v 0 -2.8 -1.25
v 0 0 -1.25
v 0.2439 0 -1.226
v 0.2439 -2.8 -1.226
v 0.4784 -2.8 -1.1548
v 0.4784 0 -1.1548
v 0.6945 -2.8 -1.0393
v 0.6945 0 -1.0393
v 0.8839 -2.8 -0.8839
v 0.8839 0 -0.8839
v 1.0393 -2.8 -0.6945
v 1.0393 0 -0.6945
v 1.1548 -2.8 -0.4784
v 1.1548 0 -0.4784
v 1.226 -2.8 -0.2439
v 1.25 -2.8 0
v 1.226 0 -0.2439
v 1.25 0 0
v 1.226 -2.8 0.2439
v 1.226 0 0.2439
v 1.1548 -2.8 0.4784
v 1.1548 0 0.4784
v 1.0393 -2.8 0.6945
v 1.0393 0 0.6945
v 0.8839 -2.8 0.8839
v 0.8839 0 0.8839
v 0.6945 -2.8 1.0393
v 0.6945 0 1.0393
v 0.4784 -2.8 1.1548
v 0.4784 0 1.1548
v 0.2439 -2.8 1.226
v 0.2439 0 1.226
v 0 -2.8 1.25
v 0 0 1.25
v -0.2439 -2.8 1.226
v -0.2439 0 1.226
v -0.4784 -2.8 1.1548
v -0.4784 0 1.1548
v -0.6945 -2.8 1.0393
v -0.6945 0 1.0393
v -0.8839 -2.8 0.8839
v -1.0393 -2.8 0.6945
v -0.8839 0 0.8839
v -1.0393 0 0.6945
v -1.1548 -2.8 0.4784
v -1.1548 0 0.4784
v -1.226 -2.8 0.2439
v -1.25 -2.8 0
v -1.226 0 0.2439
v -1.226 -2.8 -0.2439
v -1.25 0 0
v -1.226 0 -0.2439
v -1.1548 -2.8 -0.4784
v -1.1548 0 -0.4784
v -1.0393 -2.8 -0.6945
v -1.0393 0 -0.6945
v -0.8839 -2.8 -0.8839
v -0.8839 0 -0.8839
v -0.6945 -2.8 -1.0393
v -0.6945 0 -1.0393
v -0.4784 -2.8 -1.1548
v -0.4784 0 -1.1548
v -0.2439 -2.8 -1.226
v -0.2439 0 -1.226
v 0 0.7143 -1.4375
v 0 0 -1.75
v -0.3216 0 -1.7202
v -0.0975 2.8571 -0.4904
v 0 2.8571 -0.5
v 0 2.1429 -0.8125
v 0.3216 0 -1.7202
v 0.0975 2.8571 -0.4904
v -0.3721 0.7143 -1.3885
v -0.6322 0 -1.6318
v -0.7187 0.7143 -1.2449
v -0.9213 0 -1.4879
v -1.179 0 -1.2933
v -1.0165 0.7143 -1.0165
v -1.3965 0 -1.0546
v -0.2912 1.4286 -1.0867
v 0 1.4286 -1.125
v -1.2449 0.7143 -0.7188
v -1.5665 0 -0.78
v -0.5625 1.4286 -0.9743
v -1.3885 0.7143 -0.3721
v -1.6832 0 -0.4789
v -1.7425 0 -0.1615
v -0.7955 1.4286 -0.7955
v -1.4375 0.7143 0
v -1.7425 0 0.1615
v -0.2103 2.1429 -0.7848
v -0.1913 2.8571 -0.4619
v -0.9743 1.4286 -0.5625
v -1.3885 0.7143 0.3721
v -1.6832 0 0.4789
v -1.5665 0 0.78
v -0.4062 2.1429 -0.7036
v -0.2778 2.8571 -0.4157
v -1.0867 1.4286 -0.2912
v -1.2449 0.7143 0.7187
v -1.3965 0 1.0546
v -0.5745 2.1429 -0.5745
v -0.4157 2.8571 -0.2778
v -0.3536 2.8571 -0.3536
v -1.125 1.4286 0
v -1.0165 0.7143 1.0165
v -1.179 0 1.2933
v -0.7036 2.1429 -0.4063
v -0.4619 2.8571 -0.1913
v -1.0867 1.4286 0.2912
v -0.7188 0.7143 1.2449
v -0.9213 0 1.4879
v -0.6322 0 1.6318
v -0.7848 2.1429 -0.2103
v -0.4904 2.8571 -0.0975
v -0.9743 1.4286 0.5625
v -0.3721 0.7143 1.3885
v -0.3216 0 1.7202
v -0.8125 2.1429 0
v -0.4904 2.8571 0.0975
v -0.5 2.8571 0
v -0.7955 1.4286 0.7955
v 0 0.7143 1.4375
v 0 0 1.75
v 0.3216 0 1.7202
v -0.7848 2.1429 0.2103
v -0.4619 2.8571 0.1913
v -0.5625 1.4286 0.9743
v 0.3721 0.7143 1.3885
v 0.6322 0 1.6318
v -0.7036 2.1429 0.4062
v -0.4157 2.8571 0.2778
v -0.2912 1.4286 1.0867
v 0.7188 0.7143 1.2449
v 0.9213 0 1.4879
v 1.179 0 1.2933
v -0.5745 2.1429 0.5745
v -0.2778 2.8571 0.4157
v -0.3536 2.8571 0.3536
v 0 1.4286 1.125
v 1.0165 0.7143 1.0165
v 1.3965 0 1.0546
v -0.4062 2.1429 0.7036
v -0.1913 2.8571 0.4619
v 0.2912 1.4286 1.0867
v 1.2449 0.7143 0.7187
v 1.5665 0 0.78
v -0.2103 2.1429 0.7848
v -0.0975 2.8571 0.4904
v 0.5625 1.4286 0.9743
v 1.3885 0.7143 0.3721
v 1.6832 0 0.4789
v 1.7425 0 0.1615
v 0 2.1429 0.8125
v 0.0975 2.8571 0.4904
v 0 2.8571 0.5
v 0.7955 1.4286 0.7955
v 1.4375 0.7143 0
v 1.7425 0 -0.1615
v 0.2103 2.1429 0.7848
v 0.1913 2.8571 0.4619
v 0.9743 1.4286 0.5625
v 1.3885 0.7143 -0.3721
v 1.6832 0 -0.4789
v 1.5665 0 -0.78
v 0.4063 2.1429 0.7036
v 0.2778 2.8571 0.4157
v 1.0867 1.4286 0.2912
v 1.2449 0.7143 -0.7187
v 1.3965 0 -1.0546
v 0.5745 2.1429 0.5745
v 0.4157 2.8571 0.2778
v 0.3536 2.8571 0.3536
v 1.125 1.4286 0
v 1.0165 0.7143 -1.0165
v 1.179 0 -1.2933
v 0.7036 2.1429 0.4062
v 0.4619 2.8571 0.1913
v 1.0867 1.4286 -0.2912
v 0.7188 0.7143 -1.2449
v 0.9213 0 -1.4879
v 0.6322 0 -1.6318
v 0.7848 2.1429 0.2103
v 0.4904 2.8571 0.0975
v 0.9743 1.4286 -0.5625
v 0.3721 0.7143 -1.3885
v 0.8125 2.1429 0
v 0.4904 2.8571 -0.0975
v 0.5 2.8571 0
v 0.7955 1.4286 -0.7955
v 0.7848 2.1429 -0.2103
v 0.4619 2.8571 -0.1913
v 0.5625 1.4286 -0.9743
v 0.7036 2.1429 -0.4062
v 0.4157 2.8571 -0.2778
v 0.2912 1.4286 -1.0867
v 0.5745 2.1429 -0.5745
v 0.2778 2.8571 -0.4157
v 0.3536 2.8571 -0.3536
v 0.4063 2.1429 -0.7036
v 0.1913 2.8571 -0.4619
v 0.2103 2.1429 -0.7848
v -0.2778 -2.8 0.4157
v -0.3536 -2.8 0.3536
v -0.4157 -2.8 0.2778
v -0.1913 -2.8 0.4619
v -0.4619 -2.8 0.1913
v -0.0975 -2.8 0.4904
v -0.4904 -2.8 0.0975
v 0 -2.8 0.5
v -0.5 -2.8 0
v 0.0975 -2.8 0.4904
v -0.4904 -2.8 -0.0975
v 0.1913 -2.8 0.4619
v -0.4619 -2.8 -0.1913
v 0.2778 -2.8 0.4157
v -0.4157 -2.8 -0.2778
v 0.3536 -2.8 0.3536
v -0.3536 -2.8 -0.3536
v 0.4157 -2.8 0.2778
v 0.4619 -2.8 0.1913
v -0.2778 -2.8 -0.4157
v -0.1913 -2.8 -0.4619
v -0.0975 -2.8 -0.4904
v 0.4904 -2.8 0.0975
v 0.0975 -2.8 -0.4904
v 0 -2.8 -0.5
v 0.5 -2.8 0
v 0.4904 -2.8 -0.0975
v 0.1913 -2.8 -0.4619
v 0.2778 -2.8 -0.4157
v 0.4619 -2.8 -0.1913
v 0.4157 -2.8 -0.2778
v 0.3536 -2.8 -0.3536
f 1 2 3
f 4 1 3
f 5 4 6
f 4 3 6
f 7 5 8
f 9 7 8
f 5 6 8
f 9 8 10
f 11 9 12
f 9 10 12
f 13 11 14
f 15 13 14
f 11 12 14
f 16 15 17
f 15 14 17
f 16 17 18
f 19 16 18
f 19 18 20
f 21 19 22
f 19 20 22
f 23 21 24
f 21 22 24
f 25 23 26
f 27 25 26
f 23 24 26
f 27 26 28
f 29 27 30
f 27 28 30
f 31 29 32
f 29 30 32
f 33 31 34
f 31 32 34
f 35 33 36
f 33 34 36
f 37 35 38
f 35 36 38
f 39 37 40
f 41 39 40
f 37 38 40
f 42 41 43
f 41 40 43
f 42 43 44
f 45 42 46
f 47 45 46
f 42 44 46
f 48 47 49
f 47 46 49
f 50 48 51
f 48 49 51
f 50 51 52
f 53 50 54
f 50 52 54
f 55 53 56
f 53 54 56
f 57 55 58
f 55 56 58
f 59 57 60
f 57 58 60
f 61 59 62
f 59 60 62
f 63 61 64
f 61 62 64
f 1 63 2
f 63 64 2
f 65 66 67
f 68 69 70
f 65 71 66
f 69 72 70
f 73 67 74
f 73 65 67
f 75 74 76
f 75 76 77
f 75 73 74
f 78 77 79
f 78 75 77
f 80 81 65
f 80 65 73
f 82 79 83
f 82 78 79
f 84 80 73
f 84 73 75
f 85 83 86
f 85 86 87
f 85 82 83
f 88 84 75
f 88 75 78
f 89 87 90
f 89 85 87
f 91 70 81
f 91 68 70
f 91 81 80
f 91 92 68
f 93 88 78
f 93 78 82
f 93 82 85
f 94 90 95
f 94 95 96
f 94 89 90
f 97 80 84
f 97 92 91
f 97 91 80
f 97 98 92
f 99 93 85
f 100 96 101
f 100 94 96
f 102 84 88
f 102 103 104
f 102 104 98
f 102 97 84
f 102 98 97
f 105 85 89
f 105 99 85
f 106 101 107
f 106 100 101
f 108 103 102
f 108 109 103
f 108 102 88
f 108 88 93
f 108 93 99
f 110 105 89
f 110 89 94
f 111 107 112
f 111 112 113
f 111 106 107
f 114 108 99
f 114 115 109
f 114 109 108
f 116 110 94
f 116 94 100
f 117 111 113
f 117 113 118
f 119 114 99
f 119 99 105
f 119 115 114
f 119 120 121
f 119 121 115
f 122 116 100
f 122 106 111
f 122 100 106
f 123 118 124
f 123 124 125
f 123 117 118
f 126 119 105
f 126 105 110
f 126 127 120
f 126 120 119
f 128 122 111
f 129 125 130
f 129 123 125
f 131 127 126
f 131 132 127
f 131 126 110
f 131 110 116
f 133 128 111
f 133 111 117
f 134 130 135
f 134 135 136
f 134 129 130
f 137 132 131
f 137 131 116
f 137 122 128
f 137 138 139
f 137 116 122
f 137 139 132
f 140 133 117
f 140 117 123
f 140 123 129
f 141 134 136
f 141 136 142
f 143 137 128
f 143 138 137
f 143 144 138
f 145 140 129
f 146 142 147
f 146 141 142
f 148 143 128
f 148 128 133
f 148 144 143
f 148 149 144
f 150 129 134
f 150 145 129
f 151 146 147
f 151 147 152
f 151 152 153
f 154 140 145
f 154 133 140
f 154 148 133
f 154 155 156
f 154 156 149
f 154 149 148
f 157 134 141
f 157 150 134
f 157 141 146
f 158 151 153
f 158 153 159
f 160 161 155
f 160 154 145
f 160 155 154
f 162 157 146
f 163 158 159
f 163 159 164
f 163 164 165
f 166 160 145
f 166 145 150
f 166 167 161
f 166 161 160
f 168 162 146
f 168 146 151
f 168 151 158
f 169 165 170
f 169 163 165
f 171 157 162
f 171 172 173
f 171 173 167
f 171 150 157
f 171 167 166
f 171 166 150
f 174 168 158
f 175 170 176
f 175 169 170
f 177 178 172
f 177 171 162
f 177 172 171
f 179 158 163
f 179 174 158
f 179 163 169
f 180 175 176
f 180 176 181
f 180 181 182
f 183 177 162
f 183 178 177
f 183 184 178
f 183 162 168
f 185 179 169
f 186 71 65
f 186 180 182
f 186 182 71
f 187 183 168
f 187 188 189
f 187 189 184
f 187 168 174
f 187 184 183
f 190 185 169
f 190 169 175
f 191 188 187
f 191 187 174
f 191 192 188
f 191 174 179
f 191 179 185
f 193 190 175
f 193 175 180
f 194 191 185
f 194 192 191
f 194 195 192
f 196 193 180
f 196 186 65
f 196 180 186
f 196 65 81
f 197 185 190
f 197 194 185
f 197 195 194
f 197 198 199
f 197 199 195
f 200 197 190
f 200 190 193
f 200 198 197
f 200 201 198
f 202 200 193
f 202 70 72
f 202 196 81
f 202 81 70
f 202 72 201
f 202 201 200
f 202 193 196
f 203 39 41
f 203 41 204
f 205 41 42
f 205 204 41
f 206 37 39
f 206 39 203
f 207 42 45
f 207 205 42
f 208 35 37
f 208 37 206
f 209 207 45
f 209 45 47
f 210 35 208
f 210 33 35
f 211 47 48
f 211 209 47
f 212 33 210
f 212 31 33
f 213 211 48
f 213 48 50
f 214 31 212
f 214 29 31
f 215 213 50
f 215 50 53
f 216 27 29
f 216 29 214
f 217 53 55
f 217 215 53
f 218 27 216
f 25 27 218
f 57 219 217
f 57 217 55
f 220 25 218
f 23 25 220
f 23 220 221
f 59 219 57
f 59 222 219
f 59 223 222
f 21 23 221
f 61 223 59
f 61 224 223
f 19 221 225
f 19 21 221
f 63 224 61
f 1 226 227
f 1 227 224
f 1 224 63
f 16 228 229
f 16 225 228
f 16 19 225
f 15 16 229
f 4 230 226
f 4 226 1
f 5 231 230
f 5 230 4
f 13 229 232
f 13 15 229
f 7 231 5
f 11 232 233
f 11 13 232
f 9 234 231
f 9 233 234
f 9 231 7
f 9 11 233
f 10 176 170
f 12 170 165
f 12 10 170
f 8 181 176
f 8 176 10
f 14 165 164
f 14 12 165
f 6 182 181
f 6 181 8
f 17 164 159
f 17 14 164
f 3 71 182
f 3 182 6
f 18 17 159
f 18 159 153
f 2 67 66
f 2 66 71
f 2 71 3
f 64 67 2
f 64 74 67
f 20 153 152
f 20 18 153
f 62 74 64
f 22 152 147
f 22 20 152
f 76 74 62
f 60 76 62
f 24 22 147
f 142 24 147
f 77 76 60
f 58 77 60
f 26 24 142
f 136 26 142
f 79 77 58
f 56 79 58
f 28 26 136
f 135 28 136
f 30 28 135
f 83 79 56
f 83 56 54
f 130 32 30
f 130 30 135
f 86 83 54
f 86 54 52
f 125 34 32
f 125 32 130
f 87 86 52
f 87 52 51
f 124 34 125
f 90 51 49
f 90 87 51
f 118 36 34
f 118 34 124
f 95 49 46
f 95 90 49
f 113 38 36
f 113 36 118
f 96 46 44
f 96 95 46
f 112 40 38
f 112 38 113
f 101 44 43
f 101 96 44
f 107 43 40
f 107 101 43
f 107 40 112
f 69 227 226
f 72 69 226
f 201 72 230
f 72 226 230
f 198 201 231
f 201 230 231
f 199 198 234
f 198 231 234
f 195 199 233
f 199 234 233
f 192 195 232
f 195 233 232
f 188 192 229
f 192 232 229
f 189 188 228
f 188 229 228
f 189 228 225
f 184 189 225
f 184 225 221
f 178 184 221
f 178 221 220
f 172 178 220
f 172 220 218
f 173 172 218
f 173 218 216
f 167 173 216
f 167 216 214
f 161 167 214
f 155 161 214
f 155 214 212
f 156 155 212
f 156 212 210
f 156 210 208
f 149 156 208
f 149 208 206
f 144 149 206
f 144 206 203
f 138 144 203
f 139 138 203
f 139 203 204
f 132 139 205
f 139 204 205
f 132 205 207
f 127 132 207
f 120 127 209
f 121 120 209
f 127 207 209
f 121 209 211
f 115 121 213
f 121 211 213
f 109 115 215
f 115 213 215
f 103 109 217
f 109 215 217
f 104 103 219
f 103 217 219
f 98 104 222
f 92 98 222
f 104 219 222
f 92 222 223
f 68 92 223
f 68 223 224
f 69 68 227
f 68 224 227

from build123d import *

# Parameters (mm, degrees)
ESQUISSE3_R             = 1.25
BOSS_EXTRU_1_DEPTH      = 2.8
ESQUISSE4_R             = 0.5
ENL_V_MAT_EXTRU_1_DEPTH = 13


with BuildPart() as part:
    # Esquisse1 → Révolution1 (revolve)
    with BuildSketch(Plane.XY, mode=Mode.PRIVATE) as r_volution1_sk:
        Polygon((0, 0), (1.75, 0), (0, 4), align=None)
    revolve(r_volution1_sk.sketch.rotate(Axis((0, 0, 0), (0, 1, 0)), 90), axis=Axis((0, 0, 0), (0, 1, 0)))  # turned: the seam where the file's is

    # Esquisse3 → Boss.-Extru.1 (add)
    with BuildSketch(Plane(origin=(0, 0, 0), x_dir=(-1, 0, 0), z_dir=(0, -1, 0))):
        with Locations(Location((0, 0, 0), (0, 0, 90))):  # turned: the seam where the file's is
            Circle(ESQUISSE3_R)
    extrude(amount=BOSS_EXTRU_1_DEPTH)

    # Esquisse4 → Enlèv. mat.-Extru.1 (cut)
    with BuildSketch(Plane.XZ.offset(2.8)):
        with Locations(Location((0, 0, 0), (0, 0, 270))):  # turned: the seam where the file's is
            Circle(ESQUISSE4_R)
    extrude(amount=-ENL_V_MAT_EXTRU_1_DEPTH, mode=Mode.SUBTRACT)


solid = part.part
